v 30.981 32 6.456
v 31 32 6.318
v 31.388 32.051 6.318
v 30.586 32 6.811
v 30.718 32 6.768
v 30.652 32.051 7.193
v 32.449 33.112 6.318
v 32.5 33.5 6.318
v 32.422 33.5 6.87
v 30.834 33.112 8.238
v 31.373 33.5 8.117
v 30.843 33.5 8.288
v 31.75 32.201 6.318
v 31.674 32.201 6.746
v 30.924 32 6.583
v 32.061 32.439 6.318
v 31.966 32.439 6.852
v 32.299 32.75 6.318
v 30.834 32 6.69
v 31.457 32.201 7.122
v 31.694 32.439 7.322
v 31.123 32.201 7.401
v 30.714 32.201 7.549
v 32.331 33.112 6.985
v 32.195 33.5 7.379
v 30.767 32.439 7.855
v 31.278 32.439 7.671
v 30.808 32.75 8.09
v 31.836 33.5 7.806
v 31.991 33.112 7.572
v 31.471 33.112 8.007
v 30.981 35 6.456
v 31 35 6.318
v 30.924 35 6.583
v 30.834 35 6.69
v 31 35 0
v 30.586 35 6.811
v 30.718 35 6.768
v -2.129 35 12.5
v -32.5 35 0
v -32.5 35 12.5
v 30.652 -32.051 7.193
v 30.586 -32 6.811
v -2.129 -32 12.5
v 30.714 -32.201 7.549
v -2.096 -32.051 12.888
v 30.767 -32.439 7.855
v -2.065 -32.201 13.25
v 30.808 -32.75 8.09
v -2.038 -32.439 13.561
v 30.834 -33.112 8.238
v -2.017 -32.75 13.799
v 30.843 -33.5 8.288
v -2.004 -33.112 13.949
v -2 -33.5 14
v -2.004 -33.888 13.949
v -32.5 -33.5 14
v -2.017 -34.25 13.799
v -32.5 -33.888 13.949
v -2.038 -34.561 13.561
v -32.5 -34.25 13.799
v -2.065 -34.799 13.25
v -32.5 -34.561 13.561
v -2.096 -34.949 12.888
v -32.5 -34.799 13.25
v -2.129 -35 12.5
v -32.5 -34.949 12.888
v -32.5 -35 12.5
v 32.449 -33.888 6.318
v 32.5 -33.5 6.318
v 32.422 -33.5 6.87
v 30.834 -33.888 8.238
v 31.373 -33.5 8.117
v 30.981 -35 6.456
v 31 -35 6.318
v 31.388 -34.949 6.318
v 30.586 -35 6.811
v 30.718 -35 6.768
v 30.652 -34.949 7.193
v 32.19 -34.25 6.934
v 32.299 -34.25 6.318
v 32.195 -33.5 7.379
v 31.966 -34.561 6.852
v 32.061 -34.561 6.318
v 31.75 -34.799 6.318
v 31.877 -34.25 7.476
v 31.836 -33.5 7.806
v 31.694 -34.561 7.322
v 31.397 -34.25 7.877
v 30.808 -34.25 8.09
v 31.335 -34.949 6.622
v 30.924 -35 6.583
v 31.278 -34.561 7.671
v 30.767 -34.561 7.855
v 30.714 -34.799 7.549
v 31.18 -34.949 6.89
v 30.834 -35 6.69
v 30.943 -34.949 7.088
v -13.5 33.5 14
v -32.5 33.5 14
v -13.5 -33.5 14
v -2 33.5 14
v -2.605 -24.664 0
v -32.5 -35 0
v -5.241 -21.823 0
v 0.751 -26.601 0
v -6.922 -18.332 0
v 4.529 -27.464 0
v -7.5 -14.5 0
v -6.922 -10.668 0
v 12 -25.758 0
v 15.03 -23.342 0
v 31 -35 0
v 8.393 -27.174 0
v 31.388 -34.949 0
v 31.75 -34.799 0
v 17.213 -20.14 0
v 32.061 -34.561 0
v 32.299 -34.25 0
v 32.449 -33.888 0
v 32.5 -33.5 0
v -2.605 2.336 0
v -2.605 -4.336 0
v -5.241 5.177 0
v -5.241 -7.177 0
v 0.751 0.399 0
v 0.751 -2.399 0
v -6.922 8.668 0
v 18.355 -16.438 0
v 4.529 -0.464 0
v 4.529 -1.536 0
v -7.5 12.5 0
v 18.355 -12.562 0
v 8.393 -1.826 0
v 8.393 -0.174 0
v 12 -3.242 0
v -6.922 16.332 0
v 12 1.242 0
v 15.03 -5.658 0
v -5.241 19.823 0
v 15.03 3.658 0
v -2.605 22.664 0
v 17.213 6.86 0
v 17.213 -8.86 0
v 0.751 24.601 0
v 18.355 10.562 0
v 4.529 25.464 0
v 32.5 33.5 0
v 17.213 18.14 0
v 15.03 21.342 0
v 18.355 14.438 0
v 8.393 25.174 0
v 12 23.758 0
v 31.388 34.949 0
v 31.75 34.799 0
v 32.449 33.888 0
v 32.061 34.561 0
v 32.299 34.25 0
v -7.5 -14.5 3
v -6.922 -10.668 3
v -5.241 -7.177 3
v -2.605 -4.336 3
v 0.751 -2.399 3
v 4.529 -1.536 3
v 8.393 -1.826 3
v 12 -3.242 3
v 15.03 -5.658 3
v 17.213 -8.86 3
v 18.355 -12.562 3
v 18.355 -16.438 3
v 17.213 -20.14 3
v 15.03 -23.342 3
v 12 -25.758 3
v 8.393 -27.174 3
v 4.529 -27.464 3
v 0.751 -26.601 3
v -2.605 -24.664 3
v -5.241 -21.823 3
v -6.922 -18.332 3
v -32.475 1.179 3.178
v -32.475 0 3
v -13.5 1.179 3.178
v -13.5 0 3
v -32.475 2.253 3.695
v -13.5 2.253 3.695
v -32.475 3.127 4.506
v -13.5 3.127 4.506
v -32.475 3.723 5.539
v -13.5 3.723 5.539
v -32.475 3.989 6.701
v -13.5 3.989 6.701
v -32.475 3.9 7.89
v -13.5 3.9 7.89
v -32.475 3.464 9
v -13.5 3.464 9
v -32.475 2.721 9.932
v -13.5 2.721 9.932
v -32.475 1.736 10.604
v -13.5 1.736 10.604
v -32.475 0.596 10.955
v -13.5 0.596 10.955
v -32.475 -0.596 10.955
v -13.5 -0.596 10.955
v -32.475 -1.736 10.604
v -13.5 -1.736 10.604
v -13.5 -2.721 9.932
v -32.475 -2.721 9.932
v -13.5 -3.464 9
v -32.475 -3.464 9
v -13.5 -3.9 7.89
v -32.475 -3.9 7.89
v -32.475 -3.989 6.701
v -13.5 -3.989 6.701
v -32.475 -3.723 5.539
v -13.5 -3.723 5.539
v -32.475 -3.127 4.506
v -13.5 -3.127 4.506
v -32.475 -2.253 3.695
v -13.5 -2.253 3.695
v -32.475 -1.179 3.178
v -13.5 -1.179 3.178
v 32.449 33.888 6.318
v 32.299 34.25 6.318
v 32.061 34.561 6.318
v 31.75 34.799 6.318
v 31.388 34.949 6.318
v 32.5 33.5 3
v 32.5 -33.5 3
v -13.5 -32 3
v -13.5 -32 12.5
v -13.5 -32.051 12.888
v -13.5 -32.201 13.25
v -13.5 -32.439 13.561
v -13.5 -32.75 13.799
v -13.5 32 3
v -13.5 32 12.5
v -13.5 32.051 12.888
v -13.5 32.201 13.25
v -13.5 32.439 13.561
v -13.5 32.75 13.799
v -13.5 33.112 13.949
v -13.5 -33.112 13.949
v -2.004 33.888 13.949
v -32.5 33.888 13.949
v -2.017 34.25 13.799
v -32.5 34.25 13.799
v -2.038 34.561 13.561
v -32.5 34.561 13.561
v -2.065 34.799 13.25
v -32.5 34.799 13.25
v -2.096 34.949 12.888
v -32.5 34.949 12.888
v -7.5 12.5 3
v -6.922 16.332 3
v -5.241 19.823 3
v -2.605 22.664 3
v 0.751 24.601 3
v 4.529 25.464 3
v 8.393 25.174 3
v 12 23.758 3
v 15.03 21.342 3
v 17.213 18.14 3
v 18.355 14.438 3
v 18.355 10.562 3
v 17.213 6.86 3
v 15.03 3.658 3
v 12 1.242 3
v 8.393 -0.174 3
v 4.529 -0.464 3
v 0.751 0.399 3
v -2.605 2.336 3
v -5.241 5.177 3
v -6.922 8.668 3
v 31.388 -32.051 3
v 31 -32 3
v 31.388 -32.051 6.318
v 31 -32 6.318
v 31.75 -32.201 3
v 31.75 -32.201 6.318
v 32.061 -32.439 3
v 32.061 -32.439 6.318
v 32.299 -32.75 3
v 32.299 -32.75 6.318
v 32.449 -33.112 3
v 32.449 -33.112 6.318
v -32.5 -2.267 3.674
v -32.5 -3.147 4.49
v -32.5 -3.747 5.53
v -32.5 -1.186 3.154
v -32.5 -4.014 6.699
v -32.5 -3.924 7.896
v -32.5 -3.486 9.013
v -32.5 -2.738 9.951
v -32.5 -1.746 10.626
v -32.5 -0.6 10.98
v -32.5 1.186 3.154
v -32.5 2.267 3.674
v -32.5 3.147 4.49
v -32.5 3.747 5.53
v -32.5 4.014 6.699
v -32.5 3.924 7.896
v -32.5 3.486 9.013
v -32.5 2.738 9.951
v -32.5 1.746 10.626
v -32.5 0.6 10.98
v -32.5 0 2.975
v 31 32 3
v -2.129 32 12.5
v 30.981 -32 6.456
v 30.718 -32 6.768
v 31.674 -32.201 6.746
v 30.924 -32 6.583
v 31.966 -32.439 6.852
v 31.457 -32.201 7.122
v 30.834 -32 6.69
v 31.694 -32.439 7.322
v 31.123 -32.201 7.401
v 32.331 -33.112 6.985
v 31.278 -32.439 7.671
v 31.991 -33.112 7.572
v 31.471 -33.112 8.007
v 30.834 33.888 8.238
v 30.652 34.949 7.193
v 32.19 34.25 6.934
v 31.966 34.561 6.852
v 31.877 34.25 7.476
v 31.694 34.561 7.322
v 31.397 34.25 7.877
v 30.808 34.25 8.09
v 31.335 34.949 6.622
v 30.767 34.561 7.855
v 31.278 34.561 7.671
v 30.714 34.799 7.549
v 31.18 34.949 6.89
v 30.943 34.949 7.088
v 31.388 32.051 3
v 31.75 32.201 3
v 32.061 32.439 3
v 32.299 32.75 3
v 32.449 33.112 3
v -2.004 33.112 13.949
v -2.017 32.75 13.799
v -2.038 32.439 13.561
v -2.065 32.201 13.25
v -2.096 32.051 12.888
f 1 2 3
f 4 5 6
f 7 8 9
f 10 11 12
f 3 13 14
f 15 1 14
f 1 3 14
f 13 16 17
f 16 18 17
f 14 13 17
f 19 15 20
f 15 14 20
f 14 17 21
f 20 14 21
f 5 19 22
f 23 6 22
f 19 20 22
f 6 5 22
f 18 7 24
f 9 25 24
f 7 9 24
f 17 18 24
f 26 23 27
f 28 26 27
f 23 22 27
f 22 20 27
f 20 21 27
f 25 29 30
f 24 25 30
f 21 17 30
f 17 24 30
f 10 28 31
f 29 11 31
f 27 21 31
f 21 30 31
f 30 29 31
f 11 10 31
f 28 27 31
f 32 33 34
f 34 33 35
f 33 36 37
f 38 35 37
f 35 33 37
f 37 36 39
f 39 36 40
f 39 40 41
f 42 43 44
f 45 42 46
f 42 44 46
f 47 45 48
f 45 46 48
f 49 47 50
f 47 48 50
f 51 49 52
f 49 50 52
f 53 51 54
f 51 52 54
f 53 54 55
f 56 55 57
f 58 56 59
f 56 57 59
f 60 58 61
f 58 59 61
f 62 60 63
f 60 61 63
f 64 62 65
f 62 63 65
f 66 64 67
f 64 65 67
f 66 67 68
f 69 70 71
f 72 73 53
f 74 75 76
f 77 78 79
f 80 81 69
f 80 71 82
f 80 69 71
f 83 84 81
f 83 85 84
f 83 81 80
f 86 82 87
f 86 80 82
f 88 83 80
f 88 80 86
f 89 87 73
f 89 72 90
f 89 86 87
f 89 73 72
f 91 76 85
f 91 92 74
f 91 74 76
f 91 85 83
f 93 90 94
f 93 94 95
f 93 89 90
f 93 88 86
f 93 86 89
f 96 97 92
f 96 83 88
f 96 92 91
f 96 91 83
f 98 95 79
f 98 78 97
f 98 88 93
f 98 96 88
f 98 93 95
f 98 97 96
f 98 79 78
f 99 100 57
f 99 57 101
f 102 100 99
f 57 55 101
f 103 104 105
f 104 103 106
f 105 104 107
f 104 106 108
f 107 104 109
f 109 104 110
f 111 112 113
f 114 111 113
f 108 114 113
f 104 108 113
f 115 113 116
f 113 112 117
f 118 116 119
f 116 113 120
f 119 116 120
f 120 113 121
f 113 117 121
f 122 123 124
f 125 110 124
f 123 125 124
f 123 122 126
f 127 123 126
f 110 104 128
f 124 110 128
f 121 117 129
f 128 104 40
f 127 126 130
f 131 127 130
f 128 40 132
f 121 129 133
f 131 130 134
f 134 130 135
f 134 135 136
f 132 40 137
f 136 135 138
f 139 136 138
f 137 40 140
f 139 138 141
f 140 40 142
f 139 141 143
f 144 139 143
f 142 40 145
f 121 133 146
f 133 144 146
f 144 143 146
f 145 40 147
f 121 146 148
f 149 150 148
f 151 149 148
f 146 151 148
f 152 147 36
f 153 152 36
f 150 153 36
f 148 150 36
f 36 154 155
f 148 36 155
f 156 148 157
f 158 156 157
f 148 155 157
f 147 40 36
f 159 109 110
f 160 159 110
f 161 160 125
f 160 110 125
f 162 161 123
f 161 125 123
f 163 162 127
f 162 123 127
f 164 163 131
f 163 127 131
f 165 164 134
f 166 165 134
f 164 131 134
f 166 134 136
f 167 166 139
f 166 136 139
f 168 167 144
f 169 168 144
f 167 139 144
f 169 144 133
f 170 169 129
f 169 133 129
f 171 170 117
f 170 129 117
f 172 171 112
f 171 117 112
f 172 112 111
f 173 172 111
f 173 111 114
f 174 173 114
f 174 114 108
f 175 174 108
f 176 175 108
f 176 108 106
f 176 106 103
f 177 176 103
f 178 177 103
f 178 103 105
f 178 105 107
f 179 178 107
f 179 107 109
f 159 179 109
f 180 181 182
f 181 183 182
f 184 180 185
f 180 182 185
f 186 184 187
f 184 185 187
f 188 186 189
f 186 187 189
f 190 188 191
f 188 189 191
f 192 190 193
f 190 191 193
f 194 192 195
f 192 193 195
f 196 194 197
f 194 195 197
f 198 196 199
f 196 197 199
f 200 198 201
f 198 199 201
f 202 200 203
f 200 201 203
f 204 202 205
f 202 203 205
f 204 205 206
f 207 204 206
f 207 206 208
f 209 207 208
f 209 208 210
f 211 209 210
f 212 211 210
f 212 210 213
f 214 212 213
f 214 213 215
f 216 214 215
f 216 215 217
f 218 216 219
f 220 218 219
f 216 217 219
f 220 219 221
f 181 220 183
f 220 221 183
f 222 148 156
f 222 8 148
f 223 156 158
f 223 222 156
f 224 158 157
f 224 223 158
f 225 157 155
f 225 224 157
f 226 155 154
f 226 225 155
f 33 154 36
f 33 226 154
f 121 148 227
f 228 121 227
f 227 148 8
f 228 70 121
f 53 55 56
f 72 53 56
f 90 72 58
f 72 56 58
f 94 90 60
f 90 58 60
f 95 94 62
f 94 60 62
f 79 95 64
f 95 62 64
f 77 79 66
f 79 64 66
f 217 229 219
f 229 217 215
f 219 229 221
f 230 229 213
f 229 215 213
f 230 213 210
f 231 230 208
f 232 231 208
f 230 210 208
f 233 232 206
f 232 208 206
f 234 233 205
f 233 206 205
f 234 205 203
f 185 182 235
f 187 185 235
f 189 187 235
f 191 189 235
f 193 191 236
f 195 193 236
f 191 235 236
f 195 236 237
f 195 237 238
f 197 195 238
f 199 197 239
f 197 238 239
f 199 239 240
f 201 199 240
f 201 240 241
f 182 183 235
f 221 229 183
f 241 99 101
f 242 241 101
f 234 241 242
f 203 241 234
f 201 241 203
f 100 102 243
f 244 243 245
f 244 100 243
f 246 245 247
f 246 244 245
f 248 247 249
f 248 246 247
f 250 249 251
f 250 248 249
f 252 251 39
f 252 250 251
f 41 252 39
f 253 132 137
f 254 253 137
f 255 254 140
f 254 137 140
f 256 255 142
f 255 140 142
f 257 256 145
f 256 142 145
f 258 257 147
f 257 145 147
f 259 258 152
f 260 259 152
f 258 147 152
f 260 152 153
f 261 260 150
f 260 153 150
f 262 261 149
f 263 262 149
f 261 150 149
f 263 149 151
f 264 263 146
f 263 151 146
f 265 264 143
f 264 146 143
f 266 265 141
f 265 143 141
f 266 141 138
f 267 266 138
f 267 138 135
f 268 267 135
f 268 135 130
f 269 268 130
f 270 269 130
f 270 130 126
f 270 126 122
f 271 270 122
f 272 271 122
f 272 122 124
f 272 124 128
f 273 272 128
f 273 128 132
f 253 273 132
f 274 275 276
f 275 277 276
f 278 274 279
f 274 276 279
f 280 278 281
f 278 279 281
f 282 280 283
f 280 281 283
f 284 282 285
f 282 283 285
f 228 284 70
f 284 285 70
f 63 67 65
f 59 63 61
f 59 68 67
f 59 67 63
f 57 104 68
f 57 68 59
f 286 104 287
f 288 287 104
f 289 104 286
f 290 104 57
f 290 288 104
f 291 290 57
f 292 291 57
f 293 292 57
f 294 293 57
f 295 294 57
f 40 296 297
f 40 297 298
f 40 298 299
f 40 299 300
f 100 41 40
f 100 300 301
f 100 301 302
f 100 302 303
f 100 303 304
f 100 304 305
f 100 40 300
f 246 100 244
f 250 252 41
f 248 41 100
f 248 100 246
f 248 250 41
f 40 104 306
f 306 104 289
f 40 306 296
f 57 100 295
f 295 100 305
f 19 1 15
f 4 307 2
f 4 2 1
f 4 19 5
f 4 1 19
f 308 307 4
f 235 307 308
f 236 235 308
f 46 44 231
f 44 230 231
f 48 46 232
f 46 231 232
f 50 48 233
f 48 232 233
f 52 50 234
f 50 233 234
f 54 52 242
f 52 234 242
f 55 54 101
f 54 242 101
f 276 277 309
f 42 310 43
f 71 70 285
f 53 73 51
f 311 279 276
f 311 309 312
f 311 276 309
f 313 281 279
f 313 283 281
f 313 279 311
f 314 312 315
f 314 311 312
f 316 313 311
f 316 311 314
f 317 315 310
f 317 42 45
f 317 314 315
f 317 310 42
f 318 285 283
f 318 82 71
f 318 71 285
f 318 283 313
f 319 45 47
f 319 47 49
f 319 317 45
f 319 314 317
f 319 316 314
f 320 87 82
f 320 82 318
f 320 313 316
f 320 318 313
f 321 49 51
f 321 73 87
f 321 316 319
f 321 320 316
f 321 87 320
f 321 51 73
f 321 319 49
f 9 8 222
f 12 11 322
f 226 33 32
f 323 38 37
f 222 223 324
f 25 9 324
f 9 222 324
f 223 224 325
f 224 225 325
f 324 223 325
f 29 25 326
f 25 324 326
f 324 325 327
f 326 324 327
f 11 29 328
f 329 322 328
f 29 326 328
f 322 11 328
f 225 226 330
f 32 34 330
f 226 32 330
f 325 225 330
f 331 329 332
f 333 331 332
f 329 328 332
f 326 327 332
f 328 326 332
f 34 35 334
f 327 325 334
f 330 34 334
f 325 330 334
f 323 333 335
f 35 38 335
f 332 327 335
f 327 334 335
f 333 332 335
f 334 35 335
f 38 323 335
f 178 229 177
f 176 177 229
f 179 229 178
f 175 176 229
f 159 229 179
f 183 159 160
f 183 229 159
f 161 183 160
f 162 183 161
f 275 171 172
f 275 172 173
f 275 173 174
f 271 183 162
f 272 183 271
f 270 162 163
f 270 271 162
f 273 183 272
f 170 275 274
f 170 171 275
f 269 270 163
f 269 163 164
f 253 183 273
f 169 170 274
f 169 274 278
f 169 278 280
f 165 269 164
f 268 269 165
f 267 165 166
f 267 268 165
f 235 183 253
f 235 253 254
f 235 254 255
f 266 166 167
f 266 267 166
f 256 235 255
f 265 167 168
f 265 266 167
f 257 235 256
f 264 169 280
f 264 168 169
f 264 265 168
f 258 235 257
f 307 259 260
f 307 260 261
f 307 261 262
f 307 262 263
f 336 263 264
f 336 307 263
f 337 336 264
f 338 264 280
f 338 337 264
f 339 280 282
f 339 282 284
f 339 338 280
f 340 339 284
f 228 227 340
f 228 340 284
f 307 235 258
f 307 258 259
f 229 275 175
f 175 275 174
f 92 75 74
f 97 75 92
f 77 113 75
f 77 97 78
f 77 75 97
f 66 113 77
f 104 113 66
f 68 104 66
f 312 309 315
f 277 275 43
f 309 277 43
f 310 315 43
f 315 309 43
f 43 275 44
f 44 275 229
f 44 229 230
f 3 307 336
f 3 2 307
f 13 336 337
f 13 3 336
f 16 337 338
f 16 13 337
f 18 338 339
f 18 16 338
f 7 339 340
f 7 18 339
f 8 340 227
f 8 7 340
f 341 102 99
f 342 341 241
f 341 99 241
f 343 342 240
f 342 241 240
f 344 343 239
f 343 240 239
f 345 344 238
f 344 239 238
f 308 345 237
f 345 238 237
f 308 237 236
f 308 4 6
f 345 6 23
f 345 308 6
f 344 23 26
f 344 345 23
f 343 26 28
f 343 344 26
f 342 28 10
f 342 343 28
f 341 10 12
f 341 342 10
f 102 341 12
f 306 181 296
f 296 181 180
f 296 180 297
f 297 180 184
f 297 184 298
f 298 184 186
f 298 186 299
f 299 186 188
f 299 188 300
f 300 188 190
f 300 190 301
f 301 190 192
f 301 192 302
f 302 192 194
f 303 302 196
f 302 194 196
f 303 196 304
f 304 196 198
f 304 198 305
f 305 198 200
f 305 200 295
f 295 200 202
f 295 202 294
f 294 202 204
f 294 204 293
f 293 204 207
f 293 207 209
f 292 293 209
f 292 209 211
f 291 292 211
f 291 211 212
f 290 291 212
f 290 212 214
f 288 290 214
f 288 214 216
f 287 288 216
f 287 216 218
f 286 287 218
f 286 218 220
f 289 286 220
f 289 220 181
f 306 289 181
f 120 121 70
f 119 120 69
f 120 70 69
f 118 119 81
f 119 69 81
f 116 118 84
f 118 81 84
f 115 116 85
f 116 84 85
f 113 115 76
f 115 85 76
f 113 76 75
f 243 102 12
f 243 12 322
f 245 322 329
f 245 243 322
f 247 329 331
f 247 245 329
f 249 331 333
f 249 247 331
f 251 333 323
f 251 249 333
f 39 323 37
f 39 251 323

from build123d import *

# Parameters (mm, degrees)
SKETCH1_W                       = 65
SKETCH1_H                       = 70
BOSS_EXTRUDE1_DEPTH             = 3
BOSS_EXTRUDE2_DEPTH             = 3
LPATTERN1_COUNT                 = 2
LPATTERN1_PITCH                 = 67
BOSS_EXTRUDE3_REACH             = 77.771
SKETCH4_W                       = 19
SKETCH4_H                       = 11
FILLET4_R                       = 2
FILLET3_R                       = 1.5
F_8_0MM_DOWEL_HOLE1_D           = 8
F_8_0MM_DOWEL_HOLE1_CSINK_D     = 8.05
F_8_0MM_DOWEL_HOLE1_CSINK_ANGLE = 90
F_1_0_26_DIAMETER_HOLE1_D       = 26
LPATTERN2_COUNT                 = 2
LPATTERN2_PITCH                 = 27


with BuildPart() as part:
    # Sketch1 → Boss-Extrude1 (new body)
    with BuildSketch(Plane.XY):
        Rectangle(SKETCH1_W, SKETCH1_H)
    extrude(amount=BOSS_EXTRUDE1_DEPTH)

    # Sketch2 → Boss-Extrude2 (add)
    with BuildSketch(Plane(origin=(-2.5, 35, 0), x_dir=(0, 0, -1), z_dir=(0, 1, 0))):
        Polygon((-14, -0.5), (-14, 30), (-3, 30), (-3, -35), (-8, -35), align=None)
    boss_extrude2 = extrude(amount=-BOSS_EXTRUDE2_DEPTH)

    # LPattern1: Boss-Extrude2 ×2
    with Locations(*[(0, -i * LPATTERN1_PITCH, 0) for i in range(1, LPATTERN1_COUNT)]):
        add(boss_extrude2)

    # Sketch4 → Boss-Extrude3 (add, up to next)
    with BuildSketch(Plane.XZ.offset(-32), mode=Mode.PRIVATE) as boss_extrude3_sk1:
        with Locations((-23, 8.5)):
            Rectangle(SKETCH4_W, SKETCH4_H)
    boss_extrude3_tool1 = extrude(boss_extrude3_sk1.sketch, amount=BOSS_EXTRUDE3_REACH, mode=Mode.PRIVATE) - part.part
    add(boss_extrude3_tool1.solids().sort_by_distance((-23, 32, 8.5))[0])

    # Fillet4
    fillet4_edges = [part.edges().sort_by_distance(p)[0] for p in [
        (32.5, 33.5, 8),
        (32.5, -33.5, 8),
    ]]
    fillet(fillet4_edges, radius=FILLET4_R)

    # Fillet3
    fillet3_edges = [part.edges().sort_by_distance(p)[0] for p in [
        (14.421341175, 32, 11.144114578),
        (14.421341175, 35, 11.144114578),
        (-17.25, 35, 14),
        (-7.75, 32, 14),
        (14.421341175, -32, 11.144114578),
        (-7.75, -32, 14),
        (-17.25, -35, 14),
        (14.421341175, -35, 11.144114578),
        (32.5, 32, 4.658902823),
        (32.030582356, 32, 7.605174145),
        (32.5, 35, 3.158902823),
        (32.030582356, 35, 7.605174145),
        (32.5, -32, 4.658902823),
        (32.030582356, -32, 7.605174145),
        (32.5, -35, 3.158902823),
        (32.030582356, -35, 7.605174145),
    ]]
    fillet(fillet3_edges, radius=FILLET3_R - 0.0001)  # a hair under: the kernel refuses the full size

    # Ø8.0mm Dowel Hole1 (through all)
    with Locations(Plane.ZY.offset(32.5)):
        with Locations((7, 0)):
            CounterSinkHole(F_8_0MM_DOWEL_HOLE1_D / 2, F_8_0MM_DOWEL_HOLE1_CSINK_D / 2, counter_sink_angle=F_8_0MM_DOWEL_HOLE1_CSINK_ANGLE)

    # Ø1.0 (26) Diameter Hole1 (through all)
    with Locations(Plane.XY.offset(3)):
        with Locations((5.5, -14.5)):
            f_1_0_26_diameter_hole1 = Hole(F_1_0_26_DIAMETER_HOLE1_D / 2)

    # LPattern2: Ø1.0 (26) Diameter Hole1 ×2
    with Locations(*[(0, i * LPATTERN2_PITCH, 0) for i in range(1, LPATTERN2_COUNT)]):
        add(f_1_0_26_diameter_hole1, mode=Mode.SUBTRACT)


solid = part.part
